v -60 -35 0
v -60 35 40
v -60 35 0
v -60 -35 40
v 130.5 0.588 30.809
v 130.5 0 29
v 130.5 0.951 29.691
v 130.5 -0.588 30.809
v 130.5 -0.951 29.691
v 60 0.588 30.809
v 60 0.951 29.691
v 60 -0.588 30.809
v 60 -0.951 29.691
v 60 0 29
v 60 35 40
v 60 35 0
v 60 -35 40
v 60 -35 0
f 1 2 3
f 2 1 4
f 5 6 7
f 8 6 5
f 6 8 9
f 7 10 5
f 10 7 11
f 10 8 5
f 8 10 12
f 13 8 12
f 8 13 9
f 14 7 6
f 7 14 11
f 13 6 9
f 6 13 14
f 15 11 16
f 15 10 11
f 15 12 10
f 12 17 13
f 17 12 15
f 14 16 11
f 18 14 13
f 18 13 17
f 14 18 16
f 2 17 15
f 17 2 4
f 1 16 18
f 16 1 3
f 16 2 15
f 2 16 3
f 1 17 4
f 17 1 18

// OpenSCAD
// Mini horizontal gel-electrophoresis buffer tank
// Print orientation: tank rests on XY plane, builds up +Z, open top

// ---- Tank dimensions ----
outer_x = 120;   // outer length along X
outer_y = 70;    // outer width along Y
outer_z = 40;    // outer height along Z
wall    = 3;     // wall thickness
floor   = 3;     // floor thickness

// ---- Platform dimensions ----
plat_len   = 60;  // platform length along X
plat_top_z = 13;  // platform top height (10 mm above inner floor)

// ---- Wire holes ----
hole_d = 2;       // hole diameter
hole_y = 0;       // hole Y position
hole_z = 30;      // hole Z position

// ---- Derived ----
inner_h = outer_z - floor;              // inner floor height (37)
overlap = 0.5;                          // cutter overshoot

union() {
    // Tank body
    translate([-outer_x/2, -outer_y/2, 0])
        cube([outer_x, outer_y, outer_z]);

    // Raised platform in middle
    translate([-plat_len/2, -outer_y/2, floor])
        cube([plat_len, outer_y, plat_top_z]);

    // Wire holes through end walls along X
    for (sx = [-1, 1])
        translate([sx > 0 ? outer_x/2 - overlap : -outer_x/2, hole_y, hole_z])
            rotate([0, 90, 0])
                cylinder(d = hole_d, h = outer_y + 2*overlap);
}
